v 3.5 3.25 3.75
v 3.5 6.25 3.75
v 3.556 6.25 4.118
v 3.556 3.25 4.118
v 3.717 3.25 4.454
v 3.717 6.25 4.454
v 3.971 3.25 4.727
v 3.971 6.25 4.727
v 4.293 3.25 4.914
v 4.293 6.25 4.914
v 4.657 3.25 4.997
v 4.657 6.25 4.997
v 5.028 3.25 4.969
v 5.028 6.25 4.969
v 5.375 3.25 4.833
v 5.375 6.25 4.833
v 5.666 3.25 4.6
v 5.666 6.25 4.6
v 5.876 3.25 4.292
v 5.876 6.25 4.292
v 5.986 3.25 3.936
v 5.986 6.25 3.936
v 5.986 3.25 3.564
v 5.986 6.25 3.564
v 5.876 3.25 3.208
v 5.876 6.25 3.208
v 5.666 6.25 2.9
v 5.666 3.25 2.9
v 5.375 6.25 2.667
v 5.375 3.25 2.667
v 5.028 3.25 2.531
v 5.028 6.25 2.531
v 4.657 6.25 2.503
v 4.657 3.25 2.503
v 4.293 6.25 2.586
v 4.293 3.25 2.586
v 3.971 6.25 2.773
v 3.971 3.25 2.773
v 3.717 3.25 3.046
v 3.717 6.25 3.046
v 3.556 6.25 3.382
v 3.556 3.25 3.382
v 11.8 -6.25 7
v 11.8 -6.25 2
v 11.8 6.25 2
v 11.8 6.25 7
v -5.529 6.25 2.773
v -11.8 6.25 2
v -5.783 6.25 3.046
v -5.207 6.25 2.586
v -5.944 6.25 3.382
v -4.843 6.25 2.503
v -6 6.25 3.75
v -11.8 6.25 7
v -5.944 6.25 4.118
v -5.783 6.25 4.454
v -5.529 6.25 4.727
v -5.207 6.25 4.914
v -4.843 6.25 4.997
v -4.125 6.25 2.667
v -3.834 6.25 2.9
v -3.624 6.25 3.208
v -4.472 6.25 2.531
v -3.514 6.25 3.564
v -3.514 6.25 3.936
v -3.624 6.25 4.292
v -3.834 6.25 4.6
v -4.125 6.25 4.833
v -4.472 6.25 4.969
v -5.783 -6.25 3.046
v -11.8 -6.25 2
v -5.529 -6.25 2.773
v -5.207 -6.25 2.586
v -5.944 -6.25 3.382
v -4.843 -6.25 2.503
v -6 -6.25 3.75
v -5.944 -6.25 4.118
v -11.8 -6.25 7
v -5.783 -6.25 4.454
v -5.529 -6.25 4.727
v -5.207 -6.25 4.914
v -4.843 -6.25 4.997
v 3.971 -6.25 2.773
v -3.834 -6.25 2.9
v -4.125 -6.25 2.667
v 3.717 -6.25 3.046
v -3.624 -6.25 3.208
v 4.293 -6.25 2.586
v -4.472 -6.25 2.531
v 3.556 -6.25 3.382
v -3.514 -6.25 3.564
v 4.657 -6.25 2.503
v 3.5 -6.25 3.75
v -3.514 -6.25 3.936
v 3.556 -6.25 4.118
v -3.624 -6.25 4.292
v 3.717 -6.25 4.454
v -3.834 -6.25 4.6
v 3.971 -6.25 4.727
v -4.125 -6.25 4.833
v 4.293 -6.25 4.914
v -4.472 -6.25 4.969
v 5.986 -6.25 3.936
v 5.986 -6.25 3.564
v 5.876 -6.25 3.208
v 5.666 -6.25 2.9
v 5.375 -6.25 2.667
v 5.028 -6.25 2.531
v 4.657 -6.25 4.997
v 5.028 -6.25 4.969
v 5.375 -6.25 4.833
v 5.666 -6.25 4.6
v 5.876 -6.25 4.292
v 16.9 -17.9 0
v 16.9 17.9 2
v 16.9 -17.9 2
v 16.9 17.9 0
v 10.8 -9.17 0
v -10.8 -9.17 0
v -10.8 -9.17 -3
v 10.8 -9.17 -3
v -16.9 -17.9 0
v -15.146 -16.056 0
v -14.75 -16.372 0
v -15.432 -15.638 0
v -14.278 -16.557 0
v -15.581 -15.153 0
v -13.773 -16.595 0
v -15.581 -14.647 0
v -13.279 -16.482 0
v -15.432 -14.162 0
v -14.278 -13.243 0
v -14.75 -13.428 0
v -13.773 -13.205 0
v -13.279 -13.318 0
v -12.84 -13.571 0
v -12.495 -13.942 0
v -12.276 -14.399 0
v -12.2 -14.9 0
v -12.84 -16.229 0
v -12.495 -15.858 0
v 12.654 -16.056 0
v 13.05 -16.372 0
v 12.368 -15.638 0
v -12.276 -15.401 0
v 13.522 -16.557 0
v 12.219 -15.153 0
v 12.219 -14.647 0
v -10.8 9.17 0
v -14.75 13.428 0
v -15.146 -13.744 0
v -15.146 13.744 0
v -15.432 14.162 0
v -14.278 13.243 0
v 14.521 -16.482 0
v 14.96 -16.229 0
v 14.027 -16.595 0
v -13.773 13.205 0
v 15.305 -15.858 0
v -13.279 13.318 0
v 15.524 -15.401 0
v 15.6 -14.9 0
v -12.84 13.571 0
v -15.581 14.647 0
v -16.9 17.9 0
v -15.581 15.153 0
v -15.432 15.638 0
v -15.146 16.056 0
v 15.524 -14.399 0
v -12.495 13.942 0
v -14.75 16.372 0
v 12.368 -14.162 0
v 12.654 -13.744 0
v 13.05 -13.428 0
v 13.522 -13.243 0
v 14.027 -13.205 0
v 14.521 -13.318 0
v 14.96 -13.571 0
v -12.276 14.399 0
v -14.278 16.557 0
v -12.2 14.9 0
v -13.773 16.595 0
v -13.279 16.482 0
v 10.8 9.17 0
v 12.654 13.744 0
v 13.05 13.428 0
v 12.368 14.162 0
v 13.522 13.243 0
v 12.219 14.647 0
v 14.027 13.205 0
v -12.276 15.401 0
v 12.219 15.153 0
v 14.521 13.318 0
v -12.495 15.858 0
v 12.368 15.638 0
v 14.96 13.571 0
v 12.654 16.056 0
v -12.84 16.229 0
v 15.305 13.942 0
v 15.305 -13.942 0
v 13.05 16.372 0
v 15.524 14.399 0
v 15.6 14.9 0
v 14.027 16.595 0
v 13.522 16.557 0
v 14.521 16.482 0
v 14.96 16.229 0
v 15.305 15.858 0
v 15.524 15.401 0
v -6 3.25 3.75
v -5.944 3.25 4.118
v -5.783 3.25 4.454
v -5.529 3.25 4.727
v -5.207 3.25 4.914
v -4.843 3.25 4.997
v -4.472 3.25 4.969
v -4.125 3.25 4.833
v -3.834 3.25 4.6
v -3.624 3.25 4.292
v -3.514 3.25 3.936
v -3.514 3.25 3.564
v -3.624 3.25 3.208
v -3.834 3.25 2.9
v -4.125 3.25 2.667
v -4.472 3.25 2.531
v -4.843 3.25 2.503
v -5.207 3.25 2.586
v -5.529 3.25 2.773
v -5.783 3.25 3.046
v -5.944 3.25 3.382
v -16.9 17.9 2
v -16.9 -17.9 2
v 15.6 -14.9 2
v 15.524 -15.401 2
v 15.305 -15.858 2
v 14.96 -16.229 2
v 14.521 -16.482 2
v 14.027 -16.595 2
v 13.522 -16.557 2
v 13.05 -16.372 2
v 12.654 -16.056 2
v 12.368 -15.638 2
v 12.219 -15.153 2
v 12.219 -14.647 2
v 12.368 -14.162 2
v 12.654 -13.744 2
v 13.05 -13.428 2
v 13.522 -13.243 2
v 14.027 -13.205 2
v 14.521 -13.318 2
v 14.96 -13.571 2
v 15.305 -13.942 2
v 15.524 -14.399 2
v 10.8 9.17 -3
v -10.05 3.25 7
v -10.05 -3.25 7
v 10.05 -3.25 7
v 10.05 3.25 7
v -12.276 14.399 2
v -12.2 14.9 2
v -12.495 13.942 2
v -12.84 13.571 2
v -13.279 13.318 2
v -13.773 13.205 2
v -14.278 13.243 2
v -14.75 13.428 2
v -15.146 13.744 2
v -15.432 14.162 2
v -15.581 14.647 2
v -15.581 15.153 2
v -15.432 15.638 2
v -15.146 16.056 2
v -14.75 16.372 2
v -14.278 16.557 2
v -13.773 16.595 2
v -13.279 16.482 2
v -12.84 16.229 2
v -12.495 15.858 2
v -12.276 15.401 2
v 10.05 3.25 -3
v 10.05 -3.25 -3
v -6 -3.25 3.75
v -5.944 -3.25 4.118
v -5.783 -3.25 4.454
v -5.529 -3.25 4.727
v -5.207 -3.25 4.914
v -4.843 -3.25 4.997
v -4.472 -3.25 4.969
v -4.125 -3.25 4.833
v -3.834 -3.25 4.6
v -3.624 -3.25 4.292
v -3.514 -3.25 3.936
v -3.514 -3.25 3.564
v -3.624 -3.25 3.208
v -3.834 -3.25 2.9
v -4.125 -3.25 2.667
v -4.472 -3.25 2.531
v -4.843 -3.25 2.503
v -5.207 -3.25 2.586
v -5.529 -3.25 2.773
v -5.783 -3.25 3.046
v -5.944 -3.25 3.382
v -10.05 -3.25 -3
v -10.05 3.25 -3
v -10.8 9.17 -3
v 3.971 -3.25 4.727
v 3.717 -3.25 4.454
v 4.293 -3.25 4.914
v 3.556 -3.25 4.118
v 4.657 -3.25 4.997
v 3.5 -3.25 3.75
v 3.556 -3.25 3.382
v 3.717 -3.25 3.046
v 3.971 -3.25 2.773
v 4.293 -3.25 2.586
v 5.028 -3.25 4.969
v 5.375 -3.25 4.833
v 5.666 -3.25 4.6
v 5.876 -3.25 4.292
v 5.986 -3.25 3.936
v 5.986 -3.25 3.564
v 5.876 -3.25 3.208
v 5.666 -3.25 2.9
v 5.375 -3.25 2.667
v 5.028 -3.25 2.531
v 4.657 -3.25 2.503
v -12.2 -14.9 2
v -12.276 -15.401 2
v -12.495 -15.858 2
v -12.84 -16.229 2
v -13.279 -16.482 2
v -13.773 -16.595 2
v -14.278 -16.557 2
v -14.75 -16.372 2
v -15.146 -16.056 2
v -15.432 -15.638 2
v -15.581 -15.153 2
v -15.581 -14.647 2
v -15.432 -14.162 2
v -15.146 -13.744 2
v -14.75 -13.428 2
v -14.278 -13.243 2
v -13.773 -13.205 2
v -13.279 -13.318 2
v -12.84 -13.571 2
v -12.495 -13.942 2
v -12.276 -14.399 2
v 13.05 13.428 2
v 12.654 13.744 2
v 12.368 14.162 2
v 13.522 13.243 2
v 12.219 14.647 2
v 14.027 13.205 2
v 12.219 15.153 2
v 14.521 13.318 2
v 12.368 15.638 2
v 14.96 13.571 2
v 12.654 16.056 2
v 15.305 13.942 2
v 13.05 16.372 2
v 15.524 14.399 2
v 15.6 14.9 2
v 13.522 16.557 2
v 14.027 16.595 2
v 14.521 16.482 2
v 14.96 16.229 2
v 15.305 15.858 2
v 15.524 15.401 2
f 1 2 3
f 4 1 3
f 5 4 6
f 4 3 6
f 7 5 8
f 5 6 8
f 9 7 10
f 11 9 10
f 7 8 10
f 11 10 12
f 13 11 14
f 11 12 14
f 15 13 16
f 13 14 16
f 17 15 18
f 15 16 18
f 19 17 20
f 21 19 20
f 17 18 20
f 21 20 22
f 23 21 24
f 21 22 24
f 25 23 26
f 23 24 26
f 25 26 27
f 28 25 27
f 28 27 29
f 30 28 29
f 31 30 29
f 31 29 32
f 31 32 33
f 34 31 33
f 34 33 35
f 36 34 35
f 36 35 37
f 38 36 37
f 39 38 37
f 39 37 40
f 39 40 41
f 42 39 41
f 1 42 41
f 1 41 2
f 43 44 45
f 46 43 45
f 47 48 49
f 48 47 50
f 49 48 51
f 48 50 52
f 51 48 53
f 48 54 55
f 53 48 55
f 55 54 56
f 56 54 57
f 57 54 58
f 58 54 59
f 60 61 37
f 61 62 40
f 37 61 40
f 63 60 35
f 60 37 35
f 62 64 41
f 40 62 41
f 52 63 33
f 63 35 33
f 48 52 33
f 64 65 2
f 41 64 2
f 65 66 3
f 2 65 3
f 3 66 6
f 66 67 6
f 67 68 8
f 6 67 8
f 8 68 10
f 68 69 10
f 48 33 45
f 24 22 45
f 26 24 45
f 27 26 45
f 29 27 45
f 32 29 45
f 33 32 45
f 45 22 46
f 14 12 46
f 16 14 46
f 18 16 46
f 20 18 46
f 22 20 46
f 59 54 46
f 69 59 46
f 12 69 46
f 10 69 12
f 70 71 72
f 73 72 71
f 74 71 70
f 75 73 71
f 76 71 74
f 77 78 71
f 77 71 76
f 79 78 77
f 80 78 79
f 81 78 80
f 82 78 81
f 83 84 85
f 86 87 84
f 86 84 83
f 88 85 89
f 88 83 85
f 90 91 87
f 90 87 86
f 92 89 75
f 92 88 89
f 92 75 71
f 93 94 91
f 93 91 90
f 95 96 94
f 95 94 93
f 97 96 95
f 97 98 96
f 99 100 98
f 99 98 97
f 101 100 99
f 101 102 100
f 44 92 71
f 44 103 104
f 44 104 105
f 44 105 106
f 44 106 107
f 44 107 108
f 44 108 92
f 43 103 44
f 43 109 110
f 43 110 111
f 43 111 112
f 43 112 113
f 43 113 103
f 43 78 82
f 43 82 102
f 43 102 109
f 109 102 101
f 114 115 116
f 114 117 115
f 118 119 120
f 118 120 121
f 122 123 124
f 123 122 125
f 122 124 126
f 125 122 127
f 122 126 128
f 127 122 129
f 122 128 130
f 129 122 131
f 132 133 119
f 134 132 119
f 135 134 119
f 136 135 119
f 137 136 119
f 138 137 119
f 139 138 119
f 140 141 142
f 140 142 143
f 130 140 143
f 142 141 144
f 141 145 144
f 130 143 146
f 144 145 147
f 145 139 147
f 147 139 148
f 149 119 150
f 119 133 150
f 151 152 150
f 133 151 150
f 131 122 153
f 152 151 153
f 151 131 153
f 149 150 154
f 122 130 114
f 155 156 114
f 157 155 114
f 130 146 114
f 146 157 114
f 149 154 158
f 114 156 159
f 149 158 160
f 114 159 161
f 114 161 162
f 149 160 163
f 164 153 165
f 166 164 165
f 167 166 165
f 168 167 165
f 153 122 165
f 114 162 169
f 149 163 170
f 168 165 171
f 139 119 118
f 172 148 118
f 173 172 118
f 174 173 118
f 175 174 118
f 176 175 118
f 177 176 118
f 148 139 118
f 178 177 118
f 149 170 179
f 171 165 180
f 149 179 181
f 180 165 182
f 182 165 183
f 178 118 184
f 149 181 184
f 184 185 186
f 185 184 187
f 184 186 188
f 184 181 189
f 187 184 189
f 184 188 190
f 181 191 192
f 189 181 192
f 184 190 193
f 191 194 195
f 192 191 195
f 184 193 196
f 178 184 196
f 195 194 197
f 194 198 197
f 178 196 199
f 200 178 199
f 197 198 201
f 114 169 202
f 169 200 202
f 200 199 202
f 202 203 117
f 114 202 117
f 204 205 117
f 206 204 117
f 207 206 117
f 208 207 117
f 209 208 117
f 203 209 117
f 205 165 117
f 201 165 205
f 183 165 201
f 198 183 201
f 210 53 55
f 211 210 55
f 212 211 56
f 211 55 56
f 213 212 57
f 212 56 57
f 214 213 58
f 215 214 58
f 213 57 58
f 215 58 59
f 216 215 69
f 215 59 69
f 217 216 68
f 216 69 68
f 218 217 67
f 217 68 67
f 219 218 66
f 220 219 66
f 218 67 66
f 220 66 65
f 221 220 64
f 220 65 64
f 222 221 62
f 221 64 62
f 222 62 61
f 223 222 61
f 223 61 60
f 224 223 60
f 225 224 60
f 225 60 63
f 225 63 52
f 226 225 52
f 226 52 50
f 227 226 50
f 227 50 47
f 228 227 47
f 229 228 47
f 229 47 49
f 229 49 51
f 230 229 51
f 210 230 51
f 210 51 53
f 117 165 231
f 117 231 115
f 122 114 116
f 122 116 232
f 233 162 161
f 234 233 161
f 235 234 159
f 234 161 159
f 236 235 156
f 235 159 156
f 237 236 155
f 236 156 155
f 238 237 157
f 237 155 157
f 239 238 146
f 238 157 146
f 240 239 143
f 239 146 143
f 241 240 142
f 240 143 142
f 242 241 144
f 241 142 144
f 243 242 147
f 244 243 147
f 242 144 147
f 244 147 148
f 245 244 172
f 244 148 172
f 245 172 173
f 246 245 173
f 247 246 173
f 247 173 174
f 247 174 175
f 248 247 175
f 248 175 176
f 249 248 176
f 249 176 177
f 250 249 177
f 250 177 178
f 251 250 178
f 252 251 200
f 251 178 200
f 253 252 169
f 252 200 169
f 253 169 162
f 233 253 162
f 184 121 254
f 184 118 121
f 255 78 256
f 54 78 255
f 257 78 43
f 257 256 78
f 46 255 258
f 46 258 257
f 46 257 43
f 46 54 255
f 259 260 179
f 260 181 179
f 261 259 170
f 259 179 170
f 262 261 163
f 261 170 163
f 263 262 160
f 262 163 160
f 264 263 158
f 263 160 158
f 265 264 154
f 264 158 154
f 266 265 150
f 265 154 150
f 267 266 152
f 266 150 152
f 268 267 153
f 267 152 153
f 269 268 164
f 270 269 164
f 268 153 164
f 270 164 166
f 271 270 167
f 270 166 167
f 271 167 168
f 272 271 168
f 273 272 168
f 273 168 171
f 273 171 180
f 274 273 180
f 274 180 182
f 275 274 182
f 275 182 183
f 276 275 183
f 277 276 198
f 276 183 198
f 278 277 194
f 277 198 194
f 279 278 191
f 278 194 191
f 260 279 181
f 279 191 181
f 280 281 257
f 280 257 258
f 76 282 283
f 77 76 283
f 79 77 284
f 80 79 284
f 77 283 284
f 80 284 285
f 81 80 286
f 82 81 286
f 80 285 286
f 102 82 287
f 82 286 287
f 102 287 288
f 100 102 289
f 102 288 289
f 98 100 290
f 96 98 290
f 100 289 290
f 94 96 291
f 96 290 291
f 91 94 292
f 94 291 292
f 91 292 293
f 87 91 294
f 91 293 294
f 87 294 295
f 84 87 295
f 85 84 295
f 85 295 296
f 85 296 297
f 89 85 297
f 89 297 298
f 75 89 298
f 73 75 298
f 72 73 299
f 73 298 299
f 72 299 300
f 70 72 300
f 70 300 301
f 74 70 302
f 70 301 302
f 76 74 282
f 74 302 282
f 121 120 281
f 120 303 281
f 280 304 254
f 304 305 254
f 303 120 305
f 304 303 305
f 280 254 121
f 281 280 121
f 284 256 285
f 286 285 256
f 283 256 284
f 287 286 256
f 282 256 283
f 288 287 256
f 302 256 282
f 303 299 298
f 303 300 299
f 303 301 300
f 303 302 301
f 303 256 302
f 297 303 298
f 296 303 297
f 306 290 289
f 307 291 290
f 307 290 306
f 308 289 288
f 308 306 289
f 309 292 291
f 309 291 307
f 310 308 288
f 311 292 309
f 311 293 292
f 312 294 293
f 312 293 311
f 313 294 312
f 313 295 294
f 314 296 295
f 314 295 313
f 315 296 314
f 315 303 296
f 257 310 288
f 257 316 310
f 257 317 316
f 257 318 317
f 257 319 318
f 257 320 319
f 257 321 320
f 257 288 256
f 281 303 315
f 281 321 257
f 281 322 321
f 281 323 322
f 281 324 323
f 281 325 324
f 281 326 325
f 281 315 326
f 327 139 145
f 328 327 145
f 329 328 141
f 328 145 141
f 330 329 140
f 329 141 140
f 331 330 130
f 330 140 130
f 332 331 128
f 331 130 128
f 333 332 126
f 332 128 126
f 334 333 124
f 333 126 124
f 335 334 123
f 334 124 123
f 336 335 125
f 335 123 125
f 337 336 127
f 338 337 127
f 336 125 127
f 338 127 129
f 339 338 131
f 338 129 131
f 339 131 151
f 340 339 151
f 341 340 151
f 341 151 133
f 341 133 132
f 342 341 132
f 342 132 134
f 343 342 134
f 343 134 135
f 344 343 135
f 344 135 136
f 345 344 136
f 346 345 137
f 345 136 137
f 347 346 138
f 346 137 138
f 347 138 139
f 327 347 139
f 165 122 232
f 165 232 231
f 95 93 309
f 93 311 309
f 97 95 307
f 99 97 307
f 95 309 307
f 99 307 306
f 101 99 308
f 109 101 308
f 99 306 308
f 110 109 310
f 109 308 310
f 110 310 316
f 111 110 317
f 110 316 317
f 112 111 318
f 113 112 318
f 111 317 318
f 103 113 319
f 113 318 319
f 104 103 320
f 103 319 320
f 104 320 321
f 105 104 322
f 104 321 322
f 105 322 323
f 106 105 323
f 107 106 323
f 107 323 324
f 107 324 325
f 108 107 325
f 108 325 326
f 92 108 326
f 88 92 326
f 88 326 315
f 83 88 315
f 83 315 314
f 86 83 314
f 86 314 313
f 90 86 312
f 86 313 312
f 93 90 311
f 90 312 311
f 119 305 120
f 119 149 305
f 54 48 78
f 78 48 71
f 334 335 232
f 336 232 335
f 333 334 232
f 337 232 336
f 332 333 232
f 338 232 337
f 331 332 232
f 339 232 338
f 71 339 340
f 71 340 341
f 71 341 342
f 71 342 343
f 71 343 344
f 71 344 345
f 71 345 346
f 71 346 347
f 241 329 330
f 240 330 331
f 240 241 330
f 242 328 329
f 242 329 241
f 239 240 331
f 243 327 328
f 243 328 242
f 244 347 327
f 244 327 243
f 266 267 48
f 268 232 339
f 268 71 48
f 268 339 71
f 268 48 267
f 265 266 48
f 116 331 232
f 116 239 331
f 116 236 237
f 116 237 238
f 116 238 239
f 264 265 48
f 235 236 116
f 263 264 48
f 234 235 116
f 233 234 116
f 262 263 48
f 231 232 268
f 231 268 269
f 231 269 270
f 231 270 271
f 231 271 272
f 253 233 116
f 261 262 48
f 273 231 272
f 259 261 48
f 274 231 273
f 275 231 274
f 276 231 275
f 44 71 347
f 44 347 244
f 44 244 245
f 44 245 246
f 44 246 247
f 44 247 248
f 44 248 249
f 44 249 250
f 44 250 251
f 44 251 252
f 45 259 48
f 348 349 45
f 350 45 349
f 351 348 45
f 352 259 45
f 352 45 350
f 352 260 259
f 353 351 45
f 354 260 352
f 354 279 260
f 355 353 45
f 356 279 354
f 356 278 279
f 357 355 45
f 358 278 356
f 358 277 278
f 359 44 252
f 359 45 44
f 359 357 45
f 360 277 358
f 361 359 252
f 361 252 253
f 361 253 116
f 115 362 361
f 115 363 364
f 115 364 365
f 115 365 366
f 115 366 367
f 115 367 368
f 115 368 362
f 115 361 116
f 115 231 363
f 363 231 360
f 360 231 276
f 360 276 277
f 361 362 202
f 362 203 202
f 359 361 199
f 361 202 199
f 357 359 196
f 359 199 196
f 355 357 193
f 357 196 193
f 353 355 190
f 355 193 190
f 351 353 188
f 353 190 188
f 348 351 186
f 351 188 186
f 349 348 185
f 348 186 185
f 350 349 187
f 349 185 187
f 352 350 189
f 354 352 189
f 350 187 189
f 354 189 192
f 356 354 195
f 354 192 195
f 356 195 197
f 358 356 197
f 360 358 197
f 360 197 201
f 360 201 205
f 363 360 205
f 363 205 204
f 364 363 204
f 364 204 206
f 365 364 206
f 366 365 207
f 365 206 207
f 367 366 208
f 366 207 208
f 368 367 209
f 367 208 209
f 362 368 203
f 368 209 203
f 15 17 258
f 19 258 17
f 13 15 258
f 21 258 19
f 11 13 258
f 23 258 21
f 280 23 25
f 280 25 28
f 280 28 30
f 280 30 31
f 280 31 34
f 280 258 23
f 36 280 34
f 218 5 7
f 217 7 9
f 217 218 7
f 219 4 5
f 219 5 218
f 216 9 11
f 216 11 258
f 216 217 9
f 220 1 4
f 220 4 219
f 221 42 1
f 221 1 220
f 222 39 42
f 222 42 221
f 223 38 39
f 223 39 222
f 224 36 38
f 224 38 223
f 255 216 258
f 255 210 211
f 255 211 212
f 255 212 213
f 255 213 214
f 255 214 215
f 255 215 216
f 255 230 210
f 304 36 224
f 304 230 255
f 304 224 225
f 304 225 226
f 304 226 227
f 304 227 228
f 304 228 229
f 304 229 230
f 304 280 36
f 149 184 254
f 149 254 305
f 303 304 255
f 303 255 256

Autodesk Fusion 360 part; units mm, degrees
sketch "Esquisse5" plane through (0, 0, 0) normal (0, 0, 1) x (1, 0, 0)
  line L0 (16.9, -17.9) -> (-16.9, -17.9)
  line L1 (-16.9, -17.9) -> (-16.9, 17.9)
  line L2 (-16.9, 17.9) -> (16.9, 17.9)
  line L3 (16.9, 17.9) -> (16.9, -17.9)
  line L4 (16.9, -17.9) -> (-16.9, 17.9) construction
  line L5 (-16.9, -17.9) -> (16.9, 17.9) construction
  circle A0 centre (-13.9, -14.9) radius 1.7
  line L6 (0, 0) -> (0, -17.9) construction
  line L7 (0, 0) -> (16.9, 0) construction
  circle A1 centre (13.9, -14.9) radius 1.7
  circle A2 centre (-13.9, 14.9) radius 1.7
  circle A3 centre (13.9, 14.9) radius 1.7
  line L8 (10.8, 9.17) -> (-10.8, 9.17)
  line L9 (-10.8, 9.17) -> (-10.8, -9.17)
  line L10 (-10.8, -9.17) -> (10.8, -9.17)
  line L11 (10.8, -9.17) -> (10.8, 9.17)
  line L12 (10.8, 9.17) -> (-10.8, -9.17) construction
  line L13 (-10.8, 9.17) -> (10.8, -9.17) construction
  line L14 (-10.05, -3.25) -> (10.05, -3.25)
  line L15 (10.05, -3.25) -> (10.05, 3.25)
  line L16 (10.05, 3.25) -> (-10.05, 3.25)
  line L17 (-10.05, 3.25) -> (-10.05, -3.25)
  line L18 (-10.05, -3.25) -> (10.05, 3.25) construction
  line L19 (10.05, -3.25) -> (-10.05, 3.25) construction
  dimension "d54" = 33.8
  dimension "d55" = 35.8
  dimension "d56" = 3.4
  dimension "d57" = 3
  dimension "d58" = 3
  dimension "d59" = 21.6
  dimension "d60" = 18.34
  dimension "d61" = 20.1
  dimension "d62" = 6.5
extrude "Extrusion3" add sketch "Esquisse5" against normal blind 3 contours L8 L9 L10 L11
extrude "Extrusion4" add sketch "Esquisse5" along normal blind 2 contours L0 L1 L2 L3
extrude "Extrusion5" add sketch "Esquisse5" along normal blind 7 contours L8 L9 L10 L11
sketch "Esquisse6" plane through (0, 9.17, 0) normal (0, 1, 0) x (-1, 0, 0)
  line L0 (-10.8, 2) -> (10.8, 2)
  line L1 (10.8, 2) -> (10.8, 7)
  line L2 (10.8, 7) -> (-10.8, 7)
  line L3 (-10.8, 7) -> (-10.8, 2)
  circle A0 centre (4.75, 3.75) radius 1.25
  circle A1 centre (-4.75, 3.75) radius 1.25
  line L4 (0, 2) -> (0, 7) construction
  dimension "d69" = 2.5
  dimension "d70" = 2.5
  dimension "d71" = 3.25
  dimension "d72" = 3.25
  dimension "d73" = 9.5
extrude "Extrusion6" cut sketch "Esquisse6" against normal through all contours A0 | A1
sketch "Esquisse7" plane through (0, 0, 7) normal (0, 0, 1) x (-1, 0, 0)
  line L0 (10.05, 3.25) -> (10.05, -3.25)
  line L1 (10.05, -3.25) -> (-10.05, -3.25)
  line L2 (-10.05, -3.25) -> (-10.05, 3.25)
  line L3 (-10.05, 3.25) -> (10.05, 3.25)
  line L4 (-10.8, 9.17) -> (-10.8, -9.17)
  line L5 (-10.8, -9.17) -> (10.8, -9.17)
  line L6 (10.8, -9.17) -> (10.8, 9.17)
  line L7 (10.8, 9.17) -> (-10.8, 9.17)
  line L8 (10.8, -6.25) -> (-10.8, -6.25)
  line L9 (-10.05, -3.25) -> (10.05, -3.25)
  line L10 (10.8, 6.25) -> (-10.8, 6.25)
  dimension "d76" = 3
  dimension "d77" = 3
extrude "Extrusion7" cut sketch "Esquisse7" against normal blind 5 contours L4 L6 L7 L10 | L4 L5 L6 L8
move_face "DécalerLesFaces1" offset 1 1 faces at (10.8, -2.0833, 3.6667)
move_face "DécalerLesFaces2" offset 1 1 faces at (-10.8, 2.0833, 3.6667)
equation "d70 = d69"
equation "d71 = 2 mm + ( 2.5 / 2 ) * 1 mm"
equation "d72 = d71"
equation "d73 = 7 mm + d69"
